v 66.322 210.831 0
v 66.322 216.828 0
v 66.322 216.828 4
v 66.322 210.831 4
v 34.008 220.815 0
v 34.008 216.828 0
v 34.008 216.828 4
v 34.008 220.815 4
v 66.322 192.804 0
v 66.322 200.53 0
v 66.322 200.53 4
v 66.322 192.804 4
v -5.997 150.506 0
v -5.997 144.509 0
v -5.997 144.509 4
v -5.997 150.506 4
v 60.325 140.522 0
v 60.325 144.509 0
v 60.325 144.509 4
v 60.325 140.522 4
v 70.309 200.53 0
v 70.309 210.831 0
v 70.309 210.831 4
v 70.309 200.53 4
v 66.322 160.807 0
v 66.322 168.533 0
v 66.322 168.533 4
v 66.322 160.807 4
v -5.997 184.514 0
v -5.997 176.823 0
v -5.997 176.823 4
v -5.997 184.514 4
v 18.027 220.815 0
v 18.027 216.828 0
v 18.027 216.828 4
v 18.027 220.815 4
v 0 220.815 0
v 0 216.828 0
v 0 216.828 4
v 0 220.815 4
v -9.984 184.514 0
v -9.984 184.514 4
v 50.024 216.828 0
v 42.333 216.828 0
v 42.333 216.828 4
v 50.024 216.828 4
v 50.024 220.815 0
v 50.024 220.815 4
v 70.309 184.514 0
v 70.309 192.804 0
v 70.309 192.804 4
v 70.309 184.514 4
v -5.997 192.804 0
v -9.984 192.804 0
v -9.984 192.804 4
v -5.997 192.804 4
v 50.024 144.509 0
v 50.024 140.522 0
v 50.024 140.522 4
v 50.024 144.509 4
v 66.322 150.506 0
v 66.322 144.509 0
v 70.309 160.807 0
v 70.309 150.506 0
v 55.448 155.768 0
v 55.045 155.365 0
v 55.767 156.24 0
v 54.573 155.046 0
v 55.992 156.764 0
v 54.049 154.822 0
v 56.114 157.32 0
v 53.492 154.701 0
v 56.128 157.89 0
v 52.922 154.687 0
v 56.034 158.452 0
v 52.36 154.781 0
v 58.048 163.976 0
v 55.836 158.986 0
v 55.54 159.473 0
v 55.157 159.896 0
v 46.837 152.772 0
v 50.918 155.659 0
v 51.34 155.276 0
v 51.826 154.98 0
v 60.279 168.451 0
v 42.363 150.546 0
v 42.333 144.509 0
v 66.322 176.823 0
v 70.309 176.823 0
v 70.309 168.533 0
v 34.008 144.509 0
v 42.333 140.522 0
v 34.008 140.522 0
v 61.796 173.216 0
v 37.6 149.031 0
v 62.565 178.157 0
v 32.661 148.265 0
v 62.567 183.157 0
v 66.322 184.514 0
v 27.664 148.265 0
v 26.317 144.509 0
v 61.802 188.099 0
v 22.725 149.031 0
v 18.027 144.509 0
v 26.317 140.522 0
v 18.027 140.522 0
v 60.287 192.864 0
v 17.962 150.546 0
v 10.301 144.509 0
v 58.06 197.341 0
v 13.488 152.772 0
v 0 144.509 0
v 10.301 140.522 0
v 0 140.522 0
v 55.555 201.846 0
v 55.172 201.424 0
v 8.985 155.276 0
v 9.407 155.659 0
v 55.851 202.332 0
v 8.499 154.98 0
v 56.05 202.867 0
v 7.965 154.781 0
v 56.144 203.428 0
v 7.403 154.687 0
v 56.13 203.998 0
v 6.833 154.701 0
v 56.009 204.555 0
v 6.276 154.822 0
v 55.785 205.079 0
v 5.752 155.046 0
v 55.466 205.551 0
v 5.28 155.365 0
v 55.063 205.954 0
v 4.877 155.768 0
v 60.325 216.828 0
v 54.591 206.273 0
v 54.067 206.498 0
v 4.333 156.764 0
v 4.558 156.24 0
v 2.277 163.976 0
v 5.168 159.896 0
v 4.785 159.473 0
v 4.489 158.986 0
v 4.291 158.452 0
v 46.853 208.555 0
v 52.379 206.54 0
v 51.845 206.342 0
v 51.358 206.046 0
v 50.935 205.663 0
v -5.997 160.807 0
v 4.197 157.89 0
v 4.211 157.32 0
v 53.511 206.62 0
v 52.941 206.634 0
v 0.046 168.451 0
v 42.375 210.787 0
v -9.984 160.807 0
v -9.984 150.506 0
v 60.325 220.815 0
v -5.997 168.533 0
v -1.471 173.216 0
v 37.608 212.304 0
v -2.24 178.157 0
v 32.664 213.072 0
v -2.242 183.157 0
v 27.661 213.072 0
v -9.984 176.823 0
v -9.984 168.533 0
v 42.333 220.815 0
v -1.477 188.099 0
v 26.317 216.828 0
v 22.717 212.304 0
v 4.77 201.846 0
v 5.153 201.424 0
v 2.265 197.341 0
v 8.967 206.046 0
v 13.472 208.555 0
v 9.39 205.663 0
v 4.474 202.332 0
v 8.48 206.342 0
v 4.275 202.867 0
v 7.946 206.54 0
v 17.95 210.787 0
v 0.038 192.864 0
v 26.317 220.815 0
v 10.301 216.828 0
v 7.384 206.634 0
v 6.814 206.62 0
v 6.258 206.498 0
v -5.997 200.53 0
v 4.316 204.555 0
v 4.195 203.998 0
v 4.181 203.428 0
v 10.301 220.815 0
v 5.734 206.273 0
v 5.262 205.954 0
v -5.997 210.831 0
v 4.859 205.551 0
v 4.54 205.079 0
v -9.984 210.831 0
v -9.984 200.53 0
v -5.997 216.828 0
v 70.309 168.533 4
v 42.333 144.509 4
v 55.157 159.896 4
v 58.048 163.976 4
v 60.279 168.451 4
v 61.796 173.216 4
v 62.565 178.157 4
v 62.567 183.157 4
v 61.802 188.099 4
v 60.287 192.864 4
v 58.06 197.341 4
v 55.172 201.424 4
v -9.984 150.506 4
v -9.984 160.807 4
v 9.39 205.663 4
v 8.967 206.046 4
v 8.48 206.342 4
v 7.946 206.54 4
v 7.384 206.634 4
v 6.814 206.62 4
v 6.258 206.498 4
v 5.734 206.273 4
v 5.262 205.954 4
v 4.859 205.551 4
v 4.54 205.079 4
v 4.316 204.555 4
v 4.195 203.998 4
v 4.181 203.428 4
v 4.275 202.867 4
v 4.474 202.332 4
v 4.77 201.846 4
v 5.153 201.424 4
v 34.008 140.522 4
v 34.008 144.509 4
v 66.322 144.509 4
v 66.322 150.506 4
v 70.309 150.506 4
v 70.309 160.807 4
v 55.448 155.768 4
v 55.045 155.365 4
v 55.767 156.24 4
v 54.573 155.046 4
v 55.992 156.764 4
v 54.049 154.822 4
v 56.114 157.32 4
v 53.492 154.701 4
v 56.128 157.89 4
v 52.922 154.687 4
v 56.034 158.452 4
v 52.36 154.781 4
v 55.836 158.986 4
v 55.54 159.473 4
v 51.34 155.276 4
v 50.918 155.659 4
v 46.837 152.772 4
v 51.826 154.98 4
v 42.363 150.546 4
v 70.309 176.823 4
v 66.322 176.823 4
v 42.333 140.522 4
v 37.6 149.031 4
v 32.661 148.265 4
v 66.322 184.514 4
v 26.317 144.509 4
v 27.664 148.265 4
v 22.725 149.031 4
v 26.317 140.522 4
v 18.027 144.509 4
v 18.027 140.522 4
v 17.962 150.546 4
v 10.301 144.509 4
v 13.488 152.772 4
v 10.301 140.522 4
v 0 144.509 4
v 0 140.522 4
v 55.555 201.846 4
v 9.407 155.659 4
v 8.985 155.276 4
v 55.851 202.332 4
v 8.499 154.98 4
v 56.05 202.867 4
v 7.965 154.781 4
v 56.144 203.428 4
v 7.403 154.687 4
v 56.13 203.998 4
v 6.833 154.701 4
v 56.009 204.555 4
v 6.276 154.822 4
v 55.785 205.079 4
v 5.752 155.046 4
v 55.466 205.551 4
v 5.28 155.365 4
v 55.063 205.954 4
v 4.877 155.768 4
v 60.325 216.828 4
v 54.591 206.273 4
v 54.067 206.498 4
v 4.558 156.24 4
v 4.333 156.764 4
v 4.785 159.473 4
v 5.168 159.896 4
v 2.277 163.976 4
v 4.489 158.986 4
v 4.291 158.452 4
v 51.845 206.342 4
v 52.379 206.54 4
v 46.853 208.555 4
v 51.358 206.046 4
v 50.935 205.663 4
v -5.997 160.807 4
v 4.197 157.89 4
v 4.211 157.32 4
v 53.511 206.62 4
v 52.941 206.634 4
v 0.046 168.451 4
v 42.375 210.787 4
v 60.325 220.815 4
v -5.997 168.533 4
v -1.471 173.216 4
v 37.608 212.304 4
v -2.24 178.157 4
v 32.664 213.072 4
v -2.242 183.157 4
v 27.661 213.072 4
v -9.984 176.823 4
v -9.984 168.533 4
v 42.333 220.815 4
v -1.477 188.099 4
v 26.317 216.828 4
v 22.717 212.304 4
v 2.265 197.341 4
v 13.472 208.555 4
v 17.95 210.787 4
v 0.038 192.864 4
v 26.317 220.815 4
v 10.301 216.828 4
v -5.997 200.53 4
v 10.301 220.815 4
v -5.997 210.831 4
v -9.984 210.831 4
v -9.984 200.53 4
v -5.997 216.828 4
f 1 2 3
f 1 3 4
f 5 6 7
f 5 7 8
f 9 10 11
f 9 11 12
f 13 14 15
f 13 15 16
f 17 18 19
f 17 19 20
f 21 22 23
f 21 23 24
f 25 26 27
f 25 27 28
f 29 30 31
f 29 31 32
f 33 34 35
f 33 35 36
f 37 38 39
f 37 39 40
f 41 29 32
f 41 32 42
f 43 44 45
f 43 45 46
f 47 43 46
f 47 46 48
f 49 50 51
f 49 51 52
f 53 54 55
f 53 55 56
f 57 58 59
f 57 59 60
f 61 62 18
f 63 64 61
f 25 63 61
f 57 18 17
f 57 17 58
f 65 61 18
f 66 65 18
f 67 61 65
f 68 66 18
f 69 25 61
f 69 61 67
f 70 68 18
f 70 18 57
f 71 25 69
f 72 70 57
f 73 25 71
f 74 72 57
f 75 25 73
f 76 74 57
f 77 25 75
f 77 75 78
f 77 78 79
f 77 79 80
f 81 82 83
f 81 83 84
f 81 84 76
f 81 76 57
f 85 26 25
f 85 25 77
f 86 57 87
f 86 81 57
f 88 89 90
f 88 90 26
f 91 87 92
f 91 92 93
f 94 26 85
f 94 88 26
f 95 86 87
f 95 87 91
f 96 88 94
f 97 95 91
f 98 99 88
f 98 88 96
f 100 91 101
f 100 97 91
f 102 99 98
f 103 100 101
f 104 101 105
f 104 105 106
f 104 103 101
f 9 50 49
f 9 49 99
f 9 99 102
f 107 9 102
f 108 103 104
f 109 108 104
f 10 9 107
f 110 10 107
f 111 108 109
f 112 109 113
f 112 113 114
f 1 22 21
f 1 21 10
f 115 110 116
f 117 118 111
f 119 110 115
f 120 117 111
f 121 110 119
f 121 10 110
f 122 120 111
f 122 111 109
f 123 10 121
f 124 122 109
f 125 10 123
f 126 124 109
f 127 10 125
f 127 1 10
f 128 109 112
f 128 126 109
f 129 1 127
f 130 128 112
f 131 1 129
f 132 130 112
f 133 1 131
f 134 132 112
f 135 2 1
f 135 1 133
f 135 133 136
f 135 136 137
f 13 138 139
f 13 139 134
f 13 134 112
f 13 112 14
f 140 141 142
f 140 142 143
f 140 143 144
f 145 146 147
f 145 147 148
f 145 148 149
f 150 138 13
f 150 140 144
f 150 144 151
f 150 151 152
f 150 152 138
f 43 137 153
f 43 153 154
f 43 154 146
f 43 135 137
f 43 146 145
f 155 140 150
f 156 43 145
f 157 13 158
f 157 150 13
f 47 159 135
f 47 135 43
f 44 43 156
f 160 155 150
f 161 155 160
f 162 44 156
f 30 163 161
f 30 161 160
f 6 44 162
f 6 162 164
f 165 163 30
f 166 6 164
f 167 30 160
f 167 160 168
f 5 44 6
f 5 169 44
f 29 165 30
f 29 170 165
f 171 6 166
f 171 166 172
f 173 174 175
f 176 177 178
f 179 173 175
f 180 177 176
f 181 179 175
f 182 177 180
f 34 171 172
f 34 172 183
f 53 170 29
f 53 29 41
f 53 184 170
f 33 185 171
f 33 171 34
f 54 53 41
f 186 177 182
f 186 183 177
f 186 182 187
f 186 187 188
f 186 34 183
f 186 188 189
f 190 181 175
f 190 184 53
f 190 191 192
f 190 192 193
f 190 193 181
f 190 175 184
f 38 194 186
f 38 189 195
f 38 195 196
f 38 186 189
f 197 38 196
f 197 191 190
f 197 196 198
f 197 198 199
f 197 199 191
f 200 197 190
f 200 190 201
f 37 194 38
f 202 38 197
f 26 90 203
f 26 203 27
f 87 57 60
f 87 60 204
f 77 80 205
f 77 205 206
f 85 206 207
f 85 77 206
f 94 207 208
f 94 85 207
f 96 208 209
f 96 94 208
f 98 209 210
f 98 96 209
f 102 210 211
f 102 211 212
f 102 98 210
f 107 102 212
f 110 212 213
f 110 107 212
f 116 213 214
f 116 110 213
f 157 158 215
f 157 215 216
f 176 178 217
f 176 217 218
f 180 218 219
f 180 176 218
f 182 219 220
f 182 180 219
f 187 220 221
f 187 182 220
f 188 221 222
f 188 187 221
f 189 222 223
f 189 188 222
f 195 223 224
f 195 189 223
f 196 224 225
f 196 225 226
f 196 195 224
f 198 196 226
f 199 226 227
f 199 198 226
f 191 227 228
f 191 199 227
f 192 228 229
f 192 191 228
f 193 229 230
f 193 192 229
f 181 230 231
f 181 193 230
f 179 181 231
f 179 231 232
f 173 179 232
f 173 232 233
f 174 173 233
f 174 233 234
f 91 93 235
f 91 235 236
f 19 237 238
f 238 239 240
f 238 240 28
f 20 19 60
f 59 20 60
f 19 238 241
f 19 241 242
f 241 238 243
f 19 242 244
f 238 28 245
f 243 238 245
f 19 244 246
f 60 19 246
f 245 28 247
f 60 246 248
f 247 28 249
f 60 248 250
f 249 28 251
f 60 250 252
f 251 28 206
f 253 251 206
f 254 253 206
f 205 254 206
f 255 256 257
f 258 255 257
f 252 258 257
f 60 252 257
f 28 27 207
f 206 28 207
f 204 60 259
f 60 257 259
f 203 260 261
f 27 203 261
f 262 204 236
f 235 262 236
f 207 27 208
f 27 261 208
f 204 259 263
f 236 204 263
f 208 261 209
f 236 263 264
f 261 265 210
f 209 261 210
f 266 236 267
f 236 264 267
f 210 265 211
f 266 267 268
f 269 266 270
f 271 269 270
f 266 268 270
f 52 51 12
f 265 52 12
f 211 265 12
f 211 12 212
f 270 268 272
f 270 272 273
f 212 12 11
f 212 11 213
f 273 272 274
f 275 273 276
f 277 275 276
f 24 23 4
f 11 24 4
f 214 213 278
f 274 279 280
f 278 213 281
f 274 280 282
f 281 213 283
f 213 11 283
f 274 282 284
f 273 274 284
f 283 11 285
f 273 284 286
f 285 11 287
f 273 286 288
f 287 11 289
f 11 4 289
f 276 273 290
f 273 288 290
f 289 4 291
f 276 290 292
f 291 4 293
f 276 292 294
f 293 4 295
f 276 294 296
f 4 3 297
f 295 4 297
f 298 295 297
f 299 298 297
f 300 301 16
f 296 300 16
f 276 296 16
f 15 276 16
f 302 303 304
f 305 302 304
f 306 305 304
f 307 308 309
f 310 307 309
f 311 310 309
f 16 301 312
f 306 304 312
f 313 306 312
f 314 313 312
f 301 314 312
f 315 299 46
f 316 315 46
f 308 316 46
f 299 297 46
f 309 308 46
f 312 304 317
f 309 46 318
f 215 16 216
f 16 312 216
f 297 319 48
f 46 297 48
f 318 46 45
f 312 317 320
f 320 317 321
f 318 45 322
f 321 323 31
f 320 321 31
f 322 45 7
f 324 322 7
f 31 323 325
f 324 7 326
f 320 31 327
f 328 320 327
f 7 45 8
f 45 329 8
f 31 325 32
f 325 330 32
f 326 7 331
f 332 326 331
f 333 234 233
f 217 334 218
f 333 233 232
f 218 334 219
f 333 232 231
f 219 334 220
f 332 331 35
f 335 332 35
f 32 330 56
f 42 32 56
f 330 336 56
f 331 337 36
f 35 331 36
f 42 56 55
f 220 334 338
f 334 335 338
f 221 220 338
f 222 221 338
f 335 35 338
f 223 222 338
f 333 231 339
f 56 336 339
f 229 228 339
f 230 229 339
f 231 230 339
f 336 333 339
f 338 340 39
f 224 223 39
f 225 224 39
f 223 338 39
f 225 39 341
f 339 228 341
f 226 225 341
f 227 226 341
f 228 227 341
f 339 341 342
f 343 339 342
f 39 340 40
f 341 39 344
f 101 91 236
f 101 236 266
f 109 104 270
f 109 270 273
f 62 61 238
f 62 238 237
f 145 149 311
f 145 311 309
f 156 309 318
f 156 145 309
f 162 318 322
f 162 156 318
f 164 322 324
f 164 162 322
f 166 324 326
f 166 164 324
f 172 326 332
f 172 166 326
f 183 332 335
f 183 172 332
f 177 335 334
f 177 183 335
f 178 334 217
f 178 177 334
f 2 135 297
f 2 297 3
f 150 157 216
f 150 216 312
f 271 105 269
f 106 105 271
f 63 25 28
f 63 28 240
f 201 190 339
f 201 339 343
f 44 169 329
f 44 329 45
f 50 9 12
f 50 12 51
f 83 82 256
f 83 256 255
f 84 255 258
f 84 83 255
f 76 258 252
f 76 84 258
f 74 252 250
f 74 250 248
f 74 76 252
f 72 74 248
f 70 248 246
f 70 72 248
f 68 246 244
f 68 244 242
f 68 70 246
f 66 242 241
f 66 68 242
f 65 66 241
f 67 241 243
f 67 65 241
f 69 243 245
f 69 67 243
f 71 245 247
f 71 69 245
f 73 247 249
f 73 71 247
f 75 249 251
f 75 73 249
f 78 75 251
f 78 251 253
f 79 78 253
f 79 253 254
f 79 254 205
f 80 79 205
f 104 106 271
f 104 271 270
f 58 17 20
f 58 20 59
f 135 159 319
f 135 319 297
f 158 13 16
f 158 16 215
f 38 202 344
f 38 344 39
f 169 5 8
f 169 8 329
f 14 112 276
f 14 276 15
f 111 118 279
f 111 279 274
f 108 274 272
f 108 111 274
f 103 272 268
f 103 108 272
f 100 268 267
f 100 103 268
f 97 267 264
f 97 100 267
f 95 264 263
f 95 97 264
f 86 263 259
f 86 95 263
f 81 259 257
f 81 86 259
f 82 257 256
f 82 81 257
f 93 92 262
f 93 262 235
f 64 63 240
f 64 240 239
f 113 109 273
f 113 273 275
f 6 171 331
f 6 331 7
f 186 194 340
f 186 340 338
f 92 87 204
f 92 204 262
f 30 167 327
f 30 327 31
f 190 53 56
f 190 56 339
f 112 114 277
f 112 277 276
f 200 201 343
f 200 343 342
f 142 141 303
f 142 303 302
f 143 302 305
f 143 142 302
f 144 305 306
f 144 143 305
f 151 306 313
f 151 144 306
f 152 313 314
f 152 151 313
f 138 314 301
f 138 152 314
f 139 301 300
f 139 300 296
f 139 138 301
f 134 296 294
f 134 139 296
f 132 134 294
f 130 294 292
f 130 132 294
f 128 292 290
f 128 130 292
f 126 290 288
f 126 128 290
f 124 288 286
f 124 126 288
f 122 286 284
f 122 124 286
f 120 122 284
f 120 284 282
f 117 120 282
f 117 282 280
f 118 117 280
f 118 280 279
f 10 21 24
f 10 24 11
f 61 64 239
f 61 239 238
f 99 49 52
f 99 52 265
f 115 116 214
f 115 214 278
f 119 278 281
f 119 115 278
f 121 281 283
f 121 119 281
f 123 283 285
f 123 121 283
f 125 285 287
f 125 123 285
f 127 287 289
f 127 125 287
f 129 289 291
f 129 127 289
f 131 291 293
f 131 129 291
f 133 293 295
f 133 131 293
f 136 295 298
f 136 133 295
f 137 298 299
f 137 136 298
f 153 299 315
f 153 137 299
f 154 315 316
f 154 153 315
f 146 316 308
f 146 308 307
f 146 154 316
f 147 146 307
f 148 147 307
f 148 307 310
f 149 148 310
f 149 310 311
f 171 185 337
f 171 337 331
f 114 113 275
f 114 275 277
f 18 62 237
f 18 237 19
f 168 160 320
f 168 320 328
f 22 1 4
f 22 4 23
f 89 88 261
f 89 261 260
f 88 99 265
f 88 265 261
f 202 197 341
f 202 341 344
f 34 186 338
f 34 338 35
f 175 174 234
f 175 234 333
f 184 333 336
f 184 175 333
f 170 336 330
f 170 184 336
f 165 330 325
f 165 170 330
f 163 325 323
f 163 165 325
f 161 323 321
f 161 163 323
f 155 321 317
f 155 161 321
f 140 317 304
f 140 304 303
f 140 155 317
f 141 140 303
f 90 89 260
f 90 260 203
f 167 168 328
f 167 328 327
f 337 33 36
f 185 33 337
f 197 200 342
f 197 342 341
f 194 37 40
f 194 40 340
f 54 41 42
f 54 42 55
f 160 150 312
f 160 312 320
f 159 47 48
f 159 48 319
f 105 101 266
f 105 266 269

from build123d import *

# Parameters (mm, degrees)
BOSS_EXTRUDE1_DEPTH = 4


with BuildPart() as part:
    # Model → Boss-Extrude1 (new body)
    with BuildSketch(Plane.XY):
        Polygon((-5.997220875, 216.82832197), (1.346e-06, 216.82832197), (1.346e-06, 220.814711934), (10.301111378, 220.814711934), (10.301111378, 216.82832197), (18.026945247, 216.82832197), (18.026945247, 220.814711934), (26.31722235, 220.814711934), (26.31722235, 216.82832197), (34.007778034, 216.82832197), (34.007778034, 220.814711934), (42.333333323, 220.814711934), (42.333333323, 216.82832197), (50.023888607, 216.82832197), (50.023888607, 220.814711934), (60.325001331, 220.814711934), (60.325001331, 216.82832197), (66.322223551, 216.82832197), (66.322223551, 210.831099749), (70.308610824, 210.831099749), (70.308610824, 200.529989717), (66.322223551, 200.529989717), (66.322223551, 192.80415652), (70.308610824, 192.80415652), (70.308610824, 184.513878576), (66.322223551, 184.513878576), (66.322223551, 176.823322787), (70.308610824, 176.823322787), (70.308610824, 168.533045011), (66.322223551, 168.533045011), (66.322223551, 160.807212487), (70.308610824, 160.807212487), (70.308610824, 150.506099764), (66.322223551, 150.506099764), (66.322223551, 144.508877543), (60.325001331, 144.508877543), (60.325001331, 140.522487579), (50.023888607, 140.522487579), (50.023888607, 144.508877543), (42.333333323, 144.508877543), (42.333333323, 140.522487579), (34.007778034, 140.522487579), (34.007778034, 144.508877543), (26.31722235, 144.508877543), (26.31722235, 140.522487579), (18.026945247, 140.522487579), (18.026945247, 144.508877543), (10.301111378, 144.508877543), (10.301111378, 140.522487579), (1.346e-06, 140.522487579), (1.346e-06, 144.508877543), (-5.997220875, 144.508877543), (-5.997220875, 150.506099764), (-9.983610839, 150.506099764), (-9.983610839, 160.807212487), (-5.997220875, 160.807212487), (-5.997220875, 168.533045011), (-9.983610839, 168.533045011), (-9.983610839, 176.823322787), (-5.997220875, 176.823322787), (-5.997220875, 184.513878576), (-9.983610839, 184.513878576), (-9.983610839, 192.80415652), (-5.997220875, 192.80415652), (-5.997220875, 200.529989717), (-9.983610839, 200.529989717), (-9.983610839, 210.831099749), (-5.997220875, 210.831099749), align=None)
        with BuildLine():
            ThreePointArc((5.152925749, 201.423626349), (-2.337496568, 180.656932441), (5.167834069, 159.895621923))
            ThreePointArc((5.167834069, 159.895621923), (5.069223804, 155.557299062), (9.407474746, 155.659024168))
            ThreePointArc((9.407474746, 155.659024168), (30.162501338, 148.168599756), (50.917527931, 155.659024168))
            ThreePointArc((50.917527931, 155.659024168), (55.255778873, 155.557299062), (55.157168608, 159.895621923))
            ThreePointArc((55.157168608, 159.895621923), (62.662499244, 180.656932441), (55.172076927, 201.423626349))
            ThreePointArc((55.172076927, 201.423626349), (55.273802033, 205.761877291), (50.935479172, 205.663267026))
            ThreePointArc((50.935479172, 205.663267026), (30.162501338, 213.168599756), (9.389523504, 205.663267026))
            ThreePointArc((9.389523504, 205.663267026), (5.051200643, 205.761877291), (5.152925749, 201.423626349))
        make_face(mode=Mode.SUBTRACT)
    extrude(amount=BOSS_EXTRUDE1_DEPTH)


solid = part.part
